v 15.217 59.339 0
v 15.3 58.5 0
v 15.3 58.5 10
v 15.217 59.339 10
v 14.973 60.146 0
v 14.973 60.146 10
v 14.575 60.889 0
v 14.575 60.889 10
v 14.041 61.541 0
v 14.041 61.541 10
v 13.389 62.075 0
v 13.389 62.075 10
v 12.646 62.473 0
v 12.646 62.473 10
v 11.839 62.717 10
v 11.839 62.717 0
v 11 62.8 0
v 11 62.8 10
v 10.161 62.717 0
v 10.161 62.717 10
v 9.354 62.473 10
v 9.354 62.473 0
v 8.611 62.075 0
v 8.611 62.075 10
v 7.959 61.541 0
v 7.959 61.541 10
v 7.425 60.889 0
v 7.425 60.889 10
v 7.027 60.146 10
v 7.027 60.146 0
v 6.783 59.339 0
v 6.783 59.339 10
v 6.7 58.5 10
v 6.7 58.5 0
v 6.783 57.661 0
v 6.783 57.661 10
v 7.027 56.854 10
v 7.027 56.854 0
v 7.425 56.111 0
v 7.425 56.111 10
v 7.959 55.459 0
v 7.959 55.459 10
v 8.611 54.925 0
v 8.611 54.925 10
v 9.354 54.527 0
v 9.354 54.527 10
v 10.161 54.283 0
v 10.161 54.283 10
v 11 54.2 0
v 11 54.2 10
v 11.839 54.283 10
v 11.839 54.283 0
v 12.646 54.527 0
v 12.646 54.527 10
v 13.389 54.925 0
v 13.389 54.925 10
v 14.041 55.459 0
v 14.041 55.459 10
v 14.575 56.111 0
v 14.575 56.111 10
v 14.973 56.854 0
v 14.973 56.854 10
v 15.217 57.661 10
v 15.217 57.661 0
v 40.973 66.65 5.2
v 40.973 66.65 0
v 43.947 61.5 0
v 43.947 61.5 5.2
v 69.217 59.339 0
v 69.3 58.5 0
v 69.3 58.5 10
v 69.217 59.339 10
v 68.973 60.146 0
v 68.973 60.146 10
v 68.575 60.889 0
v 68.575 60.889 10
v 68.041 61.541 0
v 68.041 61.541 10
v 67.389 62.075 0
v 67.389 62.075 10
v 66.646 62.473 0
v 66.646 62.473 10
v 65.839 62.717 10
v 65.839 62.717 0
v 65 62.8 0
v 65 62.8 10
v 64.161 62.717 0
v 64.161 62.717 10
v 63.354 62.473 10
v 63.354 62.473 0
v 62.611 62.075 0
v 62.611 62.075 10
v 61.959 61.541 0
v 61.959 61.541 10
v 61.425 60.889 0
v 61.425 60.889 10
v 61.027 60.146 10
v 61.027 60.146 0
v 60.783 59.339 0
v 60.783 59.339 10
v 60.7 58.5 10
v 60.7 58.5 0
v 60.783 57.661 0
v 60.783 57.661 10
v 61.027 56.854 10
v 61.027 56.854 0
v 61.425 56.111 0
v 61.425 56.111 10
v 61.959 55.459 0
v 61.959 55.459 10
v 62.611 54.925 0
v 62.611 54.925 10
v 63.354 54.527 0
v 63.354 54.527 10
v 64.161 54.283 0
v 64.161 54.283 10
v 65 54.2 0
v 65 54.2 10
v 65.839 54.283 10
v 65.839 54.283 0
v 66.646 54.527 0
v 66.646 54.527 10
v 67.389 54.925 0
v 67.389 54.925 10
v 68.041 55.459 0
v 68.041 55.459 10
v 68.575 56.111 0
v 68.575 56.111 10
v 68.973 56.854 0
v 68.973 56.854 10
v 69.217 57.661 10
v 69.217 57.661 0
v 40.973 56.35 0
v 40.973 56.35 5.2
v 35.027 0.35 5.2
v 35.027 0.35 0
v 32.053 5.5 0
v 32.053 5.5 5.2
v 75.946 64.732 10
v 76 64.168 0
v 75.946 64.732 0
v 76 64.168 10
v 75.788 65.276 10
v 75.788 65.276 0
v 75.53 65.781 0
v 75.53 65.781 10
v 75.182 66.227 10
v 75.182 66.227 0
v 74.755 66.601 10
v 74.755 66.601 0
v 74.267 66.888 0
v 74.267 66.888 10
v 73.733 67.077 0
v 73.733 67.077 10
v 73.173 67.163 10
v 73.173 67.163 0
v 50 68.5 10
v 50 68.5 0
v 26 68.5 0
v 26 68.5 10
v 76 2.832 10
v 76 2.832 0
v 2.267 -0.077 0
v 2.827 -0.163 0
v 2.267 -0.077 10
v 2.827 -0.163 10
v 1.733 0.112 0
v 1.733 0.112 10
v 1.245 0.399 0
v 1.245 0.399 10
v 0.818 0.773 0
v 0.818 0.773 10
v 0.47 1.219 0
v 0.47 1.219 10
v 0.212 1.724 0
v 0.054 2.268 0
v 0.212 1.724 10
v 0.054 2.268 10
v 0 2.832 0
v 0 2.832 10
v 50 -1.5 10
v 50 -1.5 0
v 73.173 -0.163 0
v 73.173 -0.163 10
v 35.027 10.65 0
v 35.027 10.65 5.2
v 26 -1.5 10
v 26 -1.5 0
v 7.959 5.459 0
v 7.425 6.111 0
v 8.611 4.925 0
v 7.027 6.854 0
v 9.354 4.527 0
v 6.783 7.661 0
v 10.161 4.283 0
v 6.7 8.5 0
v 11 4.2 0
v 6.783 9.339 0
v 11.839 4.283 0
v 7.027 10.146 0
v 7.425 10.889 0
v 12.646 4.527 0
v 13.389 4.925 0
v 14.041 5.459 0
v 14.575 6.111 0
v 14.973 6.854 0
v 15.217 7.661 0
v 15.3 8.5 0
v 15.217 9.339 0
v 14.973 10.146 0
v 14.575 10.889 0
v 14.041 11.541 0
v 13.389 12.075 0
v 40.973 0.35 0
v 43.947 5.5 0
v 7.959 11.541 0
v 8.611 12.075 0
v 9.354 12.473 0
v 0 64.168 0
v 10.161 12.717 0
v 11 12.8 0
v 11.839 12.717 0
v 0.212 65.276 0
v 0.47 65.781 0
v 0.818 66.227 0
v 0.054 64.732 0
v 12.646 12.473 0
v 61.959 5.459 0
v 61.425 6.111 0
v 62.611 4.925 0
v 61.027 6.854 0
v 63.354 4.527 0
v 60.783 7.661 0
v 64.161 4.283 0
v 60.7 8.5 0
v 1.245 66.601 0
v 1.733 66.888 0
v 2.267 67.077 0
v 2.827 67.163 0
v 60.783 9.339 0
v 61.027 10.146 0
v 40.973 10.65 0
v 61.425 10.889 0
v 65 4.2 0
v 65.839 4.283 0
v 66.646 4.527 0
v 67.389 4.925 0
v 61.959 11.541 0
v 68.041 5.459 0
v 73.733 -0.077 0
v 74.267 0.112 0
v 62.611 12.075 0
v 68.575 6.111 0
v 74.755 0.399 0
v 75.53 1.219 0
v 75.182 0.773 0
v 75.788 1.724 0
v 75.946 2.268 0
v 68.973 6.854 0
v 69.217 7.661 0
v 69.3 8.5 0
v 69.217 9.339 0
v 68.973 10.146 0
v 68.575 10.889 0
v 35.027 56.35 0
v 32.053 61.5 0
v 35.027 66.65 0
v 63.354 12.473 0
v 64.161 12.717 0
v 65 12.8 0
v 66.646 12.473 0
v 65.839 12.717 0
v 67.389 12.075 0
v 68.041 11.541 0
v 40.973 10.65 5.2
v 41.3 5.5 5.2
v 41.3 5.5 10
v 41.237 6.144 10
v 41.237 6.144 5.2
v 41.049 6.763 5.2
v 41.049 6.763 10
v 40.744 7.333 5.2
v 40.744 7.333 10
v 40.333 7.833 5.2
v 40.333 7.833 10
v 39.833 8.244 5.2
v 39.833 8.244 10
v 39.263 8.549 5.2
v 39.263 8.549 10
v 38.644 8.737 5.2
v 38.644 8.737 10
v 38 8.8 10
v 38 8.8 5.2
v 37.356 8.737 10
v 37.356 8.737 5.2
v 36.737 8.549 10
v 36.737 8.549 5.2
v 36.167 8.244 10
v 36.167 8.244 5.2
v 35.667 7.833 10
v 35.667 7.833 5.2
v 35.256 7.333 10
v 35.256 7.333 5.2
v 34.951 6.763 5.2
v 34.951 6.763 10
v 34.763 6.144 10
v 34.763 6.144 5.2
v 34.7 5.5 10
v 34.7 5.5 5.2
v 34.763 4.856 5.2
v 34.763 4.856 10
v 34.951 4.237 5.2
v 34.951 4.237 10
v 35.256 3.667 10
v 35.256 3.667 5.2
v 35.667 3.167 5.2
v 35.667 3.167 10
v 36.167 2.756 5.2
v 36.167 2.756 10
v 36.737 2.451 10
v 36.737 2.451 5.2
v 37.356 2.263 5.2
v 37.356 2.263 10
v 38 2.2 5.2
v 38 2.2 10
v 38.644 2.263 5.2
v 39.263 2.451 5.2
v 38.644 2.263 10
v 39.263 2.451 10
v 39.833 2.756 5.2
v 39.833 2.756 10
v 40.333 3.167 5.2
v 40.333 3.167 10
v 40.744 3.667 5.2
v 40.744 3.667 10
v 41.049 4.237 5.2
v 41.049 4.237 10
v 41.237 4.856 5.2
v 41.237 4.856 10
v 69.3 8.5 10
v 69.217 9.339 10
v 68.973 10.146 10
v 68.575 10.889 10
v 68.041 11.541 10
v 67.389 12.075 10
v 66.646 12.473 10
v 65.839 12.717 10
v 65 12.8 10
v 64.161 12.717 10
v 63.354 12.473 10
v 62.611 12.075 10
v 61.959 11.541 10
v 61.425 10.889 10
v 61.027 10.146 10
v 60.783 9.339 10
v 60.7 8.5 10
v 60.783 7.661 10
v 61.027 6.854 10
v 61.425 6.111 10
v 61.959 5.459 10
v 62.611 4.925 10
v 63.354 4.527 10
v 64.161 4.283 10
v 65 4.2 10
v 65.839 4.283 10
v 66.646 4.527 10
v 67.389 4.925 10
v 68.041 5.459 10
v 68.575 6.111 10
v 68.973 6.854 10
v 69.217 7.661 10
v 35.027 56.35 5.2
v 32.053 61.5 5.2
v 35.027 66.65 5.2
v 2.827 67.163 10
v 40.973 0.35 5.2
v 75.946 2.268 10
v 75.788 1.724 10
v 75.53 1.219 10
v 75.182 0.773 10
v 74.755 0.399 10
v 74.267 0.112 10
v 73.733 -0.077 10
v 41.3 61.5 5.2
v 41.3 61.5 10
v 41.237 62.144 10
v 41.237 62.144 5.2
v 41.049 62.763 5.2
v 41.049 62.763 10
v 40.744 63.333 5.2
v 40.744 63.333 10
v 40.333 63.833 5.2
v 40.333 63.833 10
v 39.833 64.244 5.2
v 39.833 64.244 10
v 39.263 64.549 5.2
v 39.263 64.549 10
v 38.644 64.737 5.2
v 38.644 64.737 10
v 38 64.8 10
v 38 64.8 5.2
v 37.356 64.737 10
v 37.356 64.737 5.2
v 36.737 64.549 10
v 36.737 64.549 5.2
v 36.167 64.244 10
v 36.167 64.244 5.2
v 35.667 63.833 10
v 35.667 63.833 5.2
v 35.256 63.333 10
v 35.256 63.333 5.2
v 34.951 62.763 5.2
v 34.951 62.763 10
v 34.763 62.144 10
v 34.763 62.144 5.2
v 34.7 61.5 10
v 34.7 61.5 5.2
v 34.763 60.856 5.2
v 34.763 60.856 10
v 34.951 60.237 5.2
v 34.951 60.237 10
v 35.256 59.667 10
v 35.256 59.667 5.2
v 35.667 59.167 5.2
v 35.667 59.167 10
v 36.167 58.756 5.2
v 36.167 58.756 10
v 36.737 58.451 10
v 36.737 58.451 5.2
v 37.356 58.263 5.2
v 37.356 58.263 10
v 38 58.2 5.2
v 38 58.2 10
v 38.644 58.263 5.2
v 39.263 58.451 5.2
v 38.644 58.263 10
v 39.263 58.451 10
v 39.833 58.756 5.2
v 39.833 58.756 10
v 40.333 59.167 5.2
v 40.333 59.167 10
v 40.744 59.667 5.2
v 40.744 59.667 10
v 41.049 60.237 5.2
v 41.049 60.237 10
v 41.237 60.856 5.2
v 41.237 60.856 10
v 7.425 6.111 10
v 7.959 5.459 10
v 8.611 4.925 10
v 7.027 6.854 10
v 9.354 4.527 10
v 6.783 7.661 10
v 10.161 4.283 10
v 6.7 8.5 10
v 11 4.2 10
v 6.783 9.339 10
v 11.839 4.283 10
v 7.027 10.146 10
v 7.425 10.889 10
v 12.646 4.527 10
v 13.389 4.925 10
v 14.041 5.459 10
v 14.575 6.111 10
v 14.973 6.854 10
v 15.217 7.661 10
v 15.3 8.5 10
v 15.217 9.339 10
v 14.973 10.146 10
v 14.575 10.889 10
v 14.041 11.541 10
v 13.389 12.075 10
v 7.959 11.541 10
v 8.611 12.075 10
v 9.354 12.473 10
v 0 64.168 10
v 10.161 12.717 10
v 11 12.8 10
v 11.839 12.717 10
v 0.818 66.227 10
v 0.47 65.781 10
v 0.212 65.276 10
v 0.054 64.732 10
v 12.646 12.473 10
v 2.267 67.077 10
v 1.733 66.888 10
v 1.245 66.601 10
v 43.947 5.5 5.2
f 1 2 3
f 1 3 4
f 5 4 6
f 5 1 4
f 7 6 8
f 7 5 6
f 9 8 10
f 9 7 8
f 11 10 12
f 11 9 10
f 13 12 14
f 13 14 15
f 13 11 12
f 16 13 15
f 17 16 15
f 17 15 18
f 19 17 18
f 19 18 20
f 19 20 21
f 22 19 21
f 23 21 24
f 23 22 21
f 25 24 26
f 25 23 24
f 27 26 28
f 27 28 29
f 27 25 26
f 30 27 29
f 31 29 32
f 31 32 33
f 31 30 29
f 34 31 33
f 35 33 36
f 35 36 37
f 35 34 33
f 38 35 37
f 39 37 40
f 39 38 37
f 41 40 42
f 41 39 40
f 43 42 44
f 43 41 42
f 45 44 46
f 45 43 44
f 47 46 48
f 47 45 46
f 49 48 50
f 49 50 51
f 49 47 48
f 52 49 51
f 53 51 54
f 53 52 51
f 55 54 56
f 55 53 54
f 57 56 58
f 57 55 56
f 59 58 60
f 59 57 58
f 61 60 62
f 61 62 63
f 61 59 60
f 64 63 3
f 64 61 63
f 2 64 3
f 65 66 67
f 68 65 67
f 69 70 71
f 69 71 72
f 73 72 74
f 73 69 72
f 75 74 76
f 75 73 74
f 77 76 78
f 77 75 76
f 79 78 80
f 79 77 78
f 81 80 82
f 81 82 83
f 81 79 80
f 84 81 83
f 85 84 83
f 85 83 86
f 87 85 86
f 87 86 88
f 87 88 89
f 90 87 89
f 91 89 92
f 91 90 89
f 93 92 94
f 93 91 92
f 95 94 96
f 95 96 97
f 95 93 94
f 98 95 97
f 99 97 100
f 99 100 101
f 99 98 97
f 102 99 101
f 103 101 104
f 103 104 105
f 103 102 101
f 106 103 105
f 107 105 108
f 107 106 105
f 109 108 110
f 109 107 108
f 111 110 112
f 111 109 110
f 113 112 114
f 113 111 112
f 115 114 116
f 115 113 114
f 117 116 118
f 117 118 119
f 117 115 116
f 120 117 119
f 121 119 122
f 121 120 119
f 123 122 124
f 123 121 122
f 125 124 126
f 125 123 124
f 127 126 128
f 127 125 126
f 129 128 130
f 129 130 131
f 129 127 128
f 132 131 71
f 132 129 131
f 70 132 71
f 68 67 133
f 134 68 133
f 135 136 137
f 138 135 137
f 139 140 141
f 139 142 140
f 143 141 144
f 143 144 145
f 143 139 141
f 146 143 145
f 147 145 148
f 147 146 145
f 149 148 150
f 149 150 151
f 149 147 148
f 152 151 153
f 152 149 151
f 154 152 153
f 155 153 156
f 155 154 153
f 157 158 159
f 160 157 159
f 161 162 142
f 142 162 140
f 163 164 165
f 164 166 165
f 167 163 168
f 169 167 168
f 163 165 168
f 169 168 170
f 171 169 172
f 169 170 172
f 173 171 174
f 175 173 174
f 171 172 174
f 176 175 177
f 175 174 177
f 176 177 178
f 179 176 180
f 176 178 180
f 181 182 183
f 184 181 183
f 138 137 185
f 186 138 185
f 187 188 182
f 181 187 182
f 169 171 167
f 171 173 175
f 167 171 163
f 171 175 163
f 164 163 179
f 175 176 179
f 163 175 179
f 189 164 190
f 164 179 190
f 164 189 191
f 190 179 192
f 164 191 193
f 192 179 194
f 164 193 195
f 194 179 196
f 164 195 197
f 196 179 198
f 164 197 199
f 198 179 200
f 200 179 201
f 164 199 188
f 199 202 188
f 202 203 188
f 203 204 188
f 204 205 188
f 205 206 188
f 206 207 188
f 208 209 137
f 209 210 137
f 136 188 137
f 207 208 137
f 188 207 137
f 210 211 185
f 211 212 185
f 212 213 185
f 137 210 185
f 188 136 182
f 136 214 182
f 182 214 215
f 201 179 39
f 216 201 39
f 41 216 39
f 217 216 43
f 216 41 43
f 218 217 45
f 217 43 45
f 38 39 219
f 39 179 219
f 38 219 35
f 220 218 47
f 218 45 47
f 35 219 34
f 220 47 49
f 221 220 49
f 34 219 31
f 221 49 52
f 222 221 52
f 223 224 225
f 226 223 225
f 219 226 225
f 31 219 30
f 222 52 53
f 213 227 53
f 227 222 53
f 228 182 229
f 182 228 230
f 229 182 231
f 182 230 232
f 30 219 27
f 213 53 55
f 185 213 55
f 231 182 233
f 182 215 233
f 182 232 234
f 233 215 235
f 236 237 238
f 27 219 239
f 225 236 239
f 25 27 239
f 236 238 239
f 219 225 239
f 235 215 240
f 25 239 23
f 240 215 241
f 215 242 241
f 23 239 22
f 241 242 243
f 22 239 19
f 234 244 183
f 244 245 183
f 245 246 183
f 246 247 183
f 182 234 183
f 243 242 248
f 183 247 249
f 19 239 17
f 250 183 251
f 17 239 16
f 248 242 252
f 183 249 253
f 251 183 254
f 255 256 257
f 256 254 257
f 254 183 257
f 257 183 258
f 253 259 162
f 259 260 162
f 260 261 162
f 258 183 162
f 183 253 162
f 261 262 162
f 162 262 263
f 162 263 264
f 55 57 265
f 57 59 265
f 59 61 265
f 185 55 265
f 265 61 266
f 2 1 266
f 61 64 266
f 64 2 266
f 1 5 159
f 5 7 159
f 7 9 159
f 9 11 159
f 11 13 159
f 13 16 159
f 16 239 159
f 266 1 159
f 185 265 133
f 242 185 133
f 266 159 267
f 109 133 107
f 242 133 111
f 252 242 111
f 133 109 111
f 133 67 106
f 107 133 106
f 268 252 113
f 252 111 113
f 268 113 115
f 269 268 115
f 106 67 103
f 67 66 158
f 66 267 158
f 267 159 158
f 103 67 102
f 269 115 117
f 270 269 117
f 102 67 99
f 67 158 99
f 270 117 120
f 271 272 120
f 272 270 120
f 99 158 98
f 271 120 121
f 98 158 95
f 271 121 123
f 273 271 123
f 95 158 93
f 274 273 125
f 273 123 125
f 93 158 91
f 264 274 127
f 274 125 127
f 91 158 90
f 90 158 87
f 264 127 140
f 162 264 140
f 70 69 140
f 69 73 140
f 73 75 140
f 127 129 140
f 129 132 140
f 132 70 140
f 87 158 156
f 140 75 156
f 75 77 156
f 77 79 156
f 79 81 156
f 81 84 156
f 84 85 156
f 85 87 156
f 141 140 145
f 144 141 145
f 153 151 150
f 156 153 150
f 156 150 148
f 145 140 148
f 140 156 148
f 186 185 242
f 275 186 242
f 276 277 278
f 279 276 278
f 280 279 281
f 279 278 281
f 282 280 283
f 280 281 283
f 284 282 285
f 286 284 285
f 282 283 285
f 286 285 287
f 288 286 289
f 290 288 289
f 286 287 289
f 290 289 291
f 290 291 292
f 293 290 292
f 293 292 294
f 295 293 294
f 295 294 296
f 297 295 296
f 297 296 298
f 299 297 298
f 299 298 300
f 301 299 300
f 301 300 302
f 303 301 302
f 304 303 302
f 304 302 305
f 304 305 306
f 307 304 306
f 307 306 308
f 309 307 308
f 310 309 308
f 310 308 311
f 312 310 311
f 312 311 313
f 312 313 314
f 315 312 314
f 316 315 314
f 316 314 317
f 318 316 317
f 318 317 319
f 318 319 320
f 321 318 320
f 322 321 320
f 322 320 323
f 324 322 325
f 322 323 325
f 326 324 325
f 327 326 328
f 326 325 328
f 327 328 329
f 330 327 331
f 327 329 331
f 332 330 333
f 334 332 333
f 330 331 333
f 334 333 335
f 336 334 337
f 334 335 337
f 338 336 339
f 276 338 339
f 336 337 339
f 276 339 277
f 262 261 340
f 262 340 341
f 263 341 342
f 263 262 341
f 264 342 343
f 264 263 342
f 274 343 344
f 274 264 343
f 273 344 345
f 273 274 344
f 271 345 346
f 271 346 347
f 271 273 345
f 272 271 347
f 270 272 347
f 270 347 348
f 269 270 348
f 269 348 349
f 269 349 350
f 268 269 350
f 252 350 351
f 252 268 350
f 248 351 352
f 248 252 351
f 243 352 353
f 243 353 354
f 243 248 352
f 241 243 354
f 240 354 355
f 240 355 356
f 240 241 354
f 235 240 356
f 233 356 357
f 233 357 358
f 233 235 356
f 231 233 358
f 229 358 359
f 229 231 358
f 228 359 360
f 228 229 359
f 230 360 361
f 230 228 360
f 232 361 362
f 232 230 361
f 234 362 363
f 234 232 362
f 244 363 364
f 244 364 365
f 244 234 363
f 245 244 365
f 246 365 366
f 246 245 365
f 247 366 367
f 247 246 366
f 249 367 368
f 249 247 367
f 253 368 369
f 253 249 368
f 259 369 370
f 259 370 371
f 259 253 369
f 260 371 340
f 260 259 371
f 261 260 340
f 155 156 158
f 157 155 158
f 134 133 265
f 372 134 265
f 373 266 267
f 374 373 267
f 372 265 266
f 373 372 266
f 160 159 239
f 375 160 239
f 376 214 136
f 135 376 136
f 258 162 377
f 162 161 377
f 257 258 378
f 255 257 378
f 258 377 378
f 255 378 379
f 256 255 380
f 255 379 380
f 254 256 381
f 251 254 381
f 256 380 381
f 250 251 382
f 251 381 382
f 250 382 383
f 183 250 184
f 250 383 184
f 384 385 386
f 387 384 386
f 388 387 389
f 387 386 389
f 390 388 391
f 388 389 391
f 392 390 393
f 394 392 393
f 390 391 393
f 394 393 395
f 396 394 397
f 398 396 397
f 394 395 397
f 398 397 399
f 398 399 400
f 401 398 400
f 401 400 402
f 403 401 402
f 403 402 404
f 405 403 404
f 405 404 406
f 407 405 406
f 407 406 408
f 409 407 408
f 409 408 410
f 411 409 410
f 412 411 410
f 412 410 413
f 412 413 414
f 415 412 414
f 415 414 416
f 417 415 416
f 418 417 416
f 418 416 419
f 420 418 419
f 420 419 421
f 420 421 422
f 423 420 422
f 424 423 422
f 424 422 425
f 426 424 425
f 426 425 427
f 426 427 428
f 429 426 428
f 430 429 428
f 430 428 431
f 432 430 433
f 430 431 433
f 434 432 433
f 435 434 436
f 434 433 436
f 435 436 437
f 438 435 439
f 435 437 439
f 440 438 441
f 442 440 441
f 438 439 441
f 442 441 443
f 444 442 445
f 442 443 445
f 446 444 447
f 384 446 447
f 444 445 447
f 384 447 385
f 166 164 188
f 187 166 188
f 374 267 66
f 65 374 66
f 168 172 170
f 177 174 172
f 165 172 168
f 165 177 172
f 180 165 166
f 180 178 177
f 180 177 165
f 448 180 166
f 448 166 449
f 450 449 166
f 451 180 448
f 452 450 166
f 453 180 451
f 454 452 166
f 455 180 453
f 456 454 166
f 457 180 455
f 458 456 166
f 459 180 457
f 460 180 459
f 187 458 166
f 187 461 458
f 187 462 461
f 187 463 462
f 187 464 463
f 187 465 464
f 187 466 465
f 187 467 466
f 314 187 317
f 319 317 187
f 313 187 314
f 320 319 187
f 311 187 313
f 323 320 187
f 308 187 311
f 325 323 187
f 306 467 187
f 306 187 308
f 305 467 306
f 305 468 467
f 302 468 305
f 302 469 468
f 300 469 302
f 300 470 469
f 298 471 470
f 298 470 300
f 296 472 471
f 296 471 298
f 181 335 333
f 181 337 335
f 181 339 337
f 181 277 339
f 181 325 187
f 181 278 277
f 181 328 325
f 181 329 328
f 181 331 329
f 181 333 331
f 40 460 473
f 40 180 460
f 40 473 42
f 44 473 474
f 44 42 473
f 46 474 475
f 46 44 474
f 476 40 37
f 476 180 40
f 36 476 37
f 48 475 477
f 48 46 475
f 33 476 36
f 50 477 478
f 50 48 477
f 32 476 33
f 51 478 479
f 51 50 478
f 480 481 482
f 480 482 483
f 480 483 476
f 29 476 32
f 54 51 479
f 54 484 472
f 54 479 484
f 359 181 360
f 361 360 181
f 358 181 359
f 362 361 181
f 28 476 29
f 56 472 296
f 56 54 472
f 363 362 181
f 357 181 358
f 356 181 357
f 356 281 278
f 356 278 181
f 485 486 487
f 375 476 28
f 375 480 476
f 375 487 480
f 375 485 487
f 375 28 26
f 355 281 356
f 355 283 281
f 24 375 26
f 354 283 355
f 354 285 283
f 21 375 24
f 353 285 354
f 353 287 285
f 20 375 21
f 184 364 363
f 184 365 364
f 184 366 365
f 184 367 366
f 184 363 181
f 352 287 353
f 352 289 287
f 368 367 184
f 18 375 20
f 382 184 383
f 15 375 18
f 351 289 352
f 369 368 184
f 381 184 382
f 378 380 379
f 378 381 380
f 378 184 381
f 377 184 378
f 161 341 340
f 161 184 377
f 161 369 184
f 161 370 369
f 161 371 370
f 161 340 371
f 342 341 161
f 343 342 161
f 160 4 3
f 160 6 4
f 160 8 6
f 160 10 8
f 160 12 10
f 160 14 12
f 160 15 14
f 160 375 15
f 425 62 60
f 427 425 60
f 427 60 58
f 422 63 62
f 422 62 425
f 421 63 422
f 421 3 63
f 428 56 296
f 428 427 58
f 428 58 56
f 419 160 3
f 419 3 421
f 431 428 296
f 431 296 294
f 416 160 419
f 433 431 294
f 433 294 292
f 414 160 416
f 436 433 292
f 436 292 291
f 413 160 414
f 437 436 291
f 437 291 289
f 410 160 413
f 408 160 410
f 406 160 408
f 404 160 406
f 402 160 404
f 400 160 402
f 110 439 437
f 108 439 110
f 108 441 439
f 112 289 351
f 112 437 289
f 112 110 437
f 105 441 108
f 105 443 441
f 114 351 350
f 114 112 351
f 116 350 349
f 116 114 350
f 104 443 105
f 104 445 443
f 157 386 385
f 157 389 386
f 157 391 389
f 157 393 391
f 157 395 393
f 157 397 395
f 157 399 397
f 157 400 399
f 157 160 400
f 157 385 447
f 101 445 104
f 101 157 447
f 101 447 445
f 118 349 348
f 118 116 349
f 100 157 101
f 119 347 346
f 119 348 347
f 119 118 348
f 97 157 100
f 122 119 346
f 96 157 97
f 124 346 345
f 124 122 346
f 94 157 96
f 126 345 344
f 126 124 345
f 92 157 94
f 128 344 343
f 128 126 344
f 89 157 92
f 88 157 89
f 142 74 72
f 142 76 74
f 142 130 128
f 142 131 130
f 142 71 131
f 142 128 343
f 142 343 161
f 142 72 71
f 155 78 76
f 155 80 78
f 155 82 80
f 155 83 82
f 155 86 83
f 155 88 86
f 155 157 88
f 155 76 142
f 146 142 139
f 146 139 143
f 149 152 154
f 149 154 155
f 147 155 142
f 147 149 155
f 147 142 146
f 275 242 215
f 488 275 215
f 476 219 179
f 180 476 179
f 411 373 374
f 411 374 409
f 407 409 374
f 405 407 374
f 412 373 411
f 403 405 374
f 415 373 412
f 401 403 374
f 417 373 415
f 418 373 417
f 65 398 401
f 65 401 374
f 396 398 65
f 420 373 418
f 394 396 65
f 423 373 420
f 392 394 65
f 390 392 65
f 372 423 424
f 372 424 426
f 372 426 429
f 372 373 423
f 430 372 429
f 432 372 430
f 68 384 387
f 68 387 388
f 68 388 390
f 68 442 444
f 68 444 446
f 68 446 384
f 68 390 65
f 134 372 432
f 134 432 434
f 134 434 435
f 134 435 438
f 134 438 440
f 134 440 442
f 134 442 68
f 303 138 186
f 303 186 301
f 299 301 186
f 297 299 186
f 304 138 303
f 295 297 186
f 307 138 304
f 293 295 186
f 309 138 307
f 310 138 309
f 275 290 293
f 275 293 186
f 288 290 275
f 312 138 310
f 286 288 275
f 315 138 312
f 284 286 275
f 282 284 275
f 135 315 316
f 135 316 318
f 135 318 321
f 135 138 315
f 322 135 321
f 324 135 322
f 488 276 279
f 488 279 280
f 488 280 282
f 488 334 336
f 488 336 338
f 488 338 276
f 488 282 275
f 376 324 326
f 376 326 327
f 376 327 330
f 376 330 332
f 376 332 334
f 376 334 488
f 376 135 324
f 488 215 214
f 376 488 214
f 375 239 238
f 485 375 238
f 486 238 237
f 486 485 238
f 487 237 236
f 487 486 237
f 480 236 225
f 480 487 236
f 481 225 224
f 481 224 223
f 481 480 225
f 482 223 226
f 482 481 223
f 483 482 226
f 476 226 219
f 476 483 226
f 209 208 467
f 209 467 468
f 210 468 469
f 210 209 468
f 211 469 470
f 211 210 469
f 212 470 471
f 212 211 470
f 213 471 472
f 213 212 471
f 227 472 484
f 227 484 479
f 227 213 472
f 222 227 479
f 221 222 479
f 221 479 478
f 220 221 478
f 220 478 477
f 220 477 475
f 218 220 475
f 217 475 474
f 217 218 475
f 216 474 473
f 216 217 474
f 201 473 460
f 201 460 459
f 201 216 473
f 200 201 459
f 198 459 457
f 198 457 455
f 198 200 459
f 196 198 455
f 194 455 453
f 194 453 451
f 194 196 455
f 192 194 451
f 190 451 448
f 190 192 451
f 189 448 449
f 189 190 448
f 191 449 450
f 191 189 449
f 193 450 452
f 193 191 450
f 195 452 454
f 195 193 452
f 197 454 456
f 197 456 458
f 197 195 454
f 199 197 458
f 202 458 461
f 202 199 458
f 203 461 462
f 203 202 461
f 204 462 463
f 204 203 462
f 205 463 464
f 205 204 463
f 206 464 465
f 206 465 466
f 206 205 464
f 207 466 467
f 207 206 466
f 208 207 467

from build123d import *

# Parameters (mm, degrees)
SKETCH_R        = 4.3
PAD_DEPTH       = 10
SKETCH001_R     = 3.3
POCKET_DEPTH    = 10.001
POCKET001_DEPTH = 5.2
FILLET_R        = 3


with BuildPart() as part:
    # Sketch → Pad (new body)
    with BuildSketch(Plane.XY):
        Polygon((76, 0), (76, 67), (50, 68.5), (26, 68.5), (0, 67), (0, 0), (26, -1.5), (50, -1.5), align=None)
        with Locations((11, 58.5)):
            Circle(SKETCH_R, mode=Mode.SUBTRACT)
        with Locations((65, 58.5)):
            Circle(SKETCH_R, mode=Mode.SUBTRACT)
        with Locations((65, 8.5)):
            Circle(SKETCH_R, mode=Mode.SUBTRACT)
        with Locations((11, 8.5)):
            Circle(SKETCH_R, mode=Mode.SUBTRACT)
    extrude(amount=PAD_DEPTH)

    # Sketch001 (on Face14 of Pad) → Pocket (cut, through all)
    with BuildSketch(Plane.XY.offset(10)):
        with Locations((38, 61.5)):
            Circle(SKETCH001_R)
        with Locations((38, 5.5)):
            Circle(SKETCH001_R)
    extrude(amount=-POCKET_DEPTH, mode=Mode.SUBTRACT)

    # Sketch002 (on Face4 of Pocket) → Pocket001 (cut)
    with BuildSketch(Plane(origin=(0, 0, 0), x_dir=(1, 0, 0), z_dir=(0, 0, -1))):
        Polygon((40.973354, -10.65), (43.946708, -5.5), (40.973354, -0.35), (35.026646, -0.35), (32.053292, -5.5), (35.026646, -10.65), align=None)
        Polygon((43.946708, -61.5), (40.973354, -56.35), (35.026646, -56.35), (32.053292, -61.5), (35.026646, -66.65), (40.973354, -66.65), align=None)
    extrude(amount=-POCKET001_DEPTH, mode=Mode.SUBTRACT)

    # Fillet
    fillet_edges = [part.edges().sort_by_distance(p)[0] for p in [
        (0, 67, 5),
        (0, 0, 5),
        (76, 0, 5),
        (76, 67, 5),
    ]]
    fillet(fillet_edges, radius=FILLET_R)


solid = part.part
